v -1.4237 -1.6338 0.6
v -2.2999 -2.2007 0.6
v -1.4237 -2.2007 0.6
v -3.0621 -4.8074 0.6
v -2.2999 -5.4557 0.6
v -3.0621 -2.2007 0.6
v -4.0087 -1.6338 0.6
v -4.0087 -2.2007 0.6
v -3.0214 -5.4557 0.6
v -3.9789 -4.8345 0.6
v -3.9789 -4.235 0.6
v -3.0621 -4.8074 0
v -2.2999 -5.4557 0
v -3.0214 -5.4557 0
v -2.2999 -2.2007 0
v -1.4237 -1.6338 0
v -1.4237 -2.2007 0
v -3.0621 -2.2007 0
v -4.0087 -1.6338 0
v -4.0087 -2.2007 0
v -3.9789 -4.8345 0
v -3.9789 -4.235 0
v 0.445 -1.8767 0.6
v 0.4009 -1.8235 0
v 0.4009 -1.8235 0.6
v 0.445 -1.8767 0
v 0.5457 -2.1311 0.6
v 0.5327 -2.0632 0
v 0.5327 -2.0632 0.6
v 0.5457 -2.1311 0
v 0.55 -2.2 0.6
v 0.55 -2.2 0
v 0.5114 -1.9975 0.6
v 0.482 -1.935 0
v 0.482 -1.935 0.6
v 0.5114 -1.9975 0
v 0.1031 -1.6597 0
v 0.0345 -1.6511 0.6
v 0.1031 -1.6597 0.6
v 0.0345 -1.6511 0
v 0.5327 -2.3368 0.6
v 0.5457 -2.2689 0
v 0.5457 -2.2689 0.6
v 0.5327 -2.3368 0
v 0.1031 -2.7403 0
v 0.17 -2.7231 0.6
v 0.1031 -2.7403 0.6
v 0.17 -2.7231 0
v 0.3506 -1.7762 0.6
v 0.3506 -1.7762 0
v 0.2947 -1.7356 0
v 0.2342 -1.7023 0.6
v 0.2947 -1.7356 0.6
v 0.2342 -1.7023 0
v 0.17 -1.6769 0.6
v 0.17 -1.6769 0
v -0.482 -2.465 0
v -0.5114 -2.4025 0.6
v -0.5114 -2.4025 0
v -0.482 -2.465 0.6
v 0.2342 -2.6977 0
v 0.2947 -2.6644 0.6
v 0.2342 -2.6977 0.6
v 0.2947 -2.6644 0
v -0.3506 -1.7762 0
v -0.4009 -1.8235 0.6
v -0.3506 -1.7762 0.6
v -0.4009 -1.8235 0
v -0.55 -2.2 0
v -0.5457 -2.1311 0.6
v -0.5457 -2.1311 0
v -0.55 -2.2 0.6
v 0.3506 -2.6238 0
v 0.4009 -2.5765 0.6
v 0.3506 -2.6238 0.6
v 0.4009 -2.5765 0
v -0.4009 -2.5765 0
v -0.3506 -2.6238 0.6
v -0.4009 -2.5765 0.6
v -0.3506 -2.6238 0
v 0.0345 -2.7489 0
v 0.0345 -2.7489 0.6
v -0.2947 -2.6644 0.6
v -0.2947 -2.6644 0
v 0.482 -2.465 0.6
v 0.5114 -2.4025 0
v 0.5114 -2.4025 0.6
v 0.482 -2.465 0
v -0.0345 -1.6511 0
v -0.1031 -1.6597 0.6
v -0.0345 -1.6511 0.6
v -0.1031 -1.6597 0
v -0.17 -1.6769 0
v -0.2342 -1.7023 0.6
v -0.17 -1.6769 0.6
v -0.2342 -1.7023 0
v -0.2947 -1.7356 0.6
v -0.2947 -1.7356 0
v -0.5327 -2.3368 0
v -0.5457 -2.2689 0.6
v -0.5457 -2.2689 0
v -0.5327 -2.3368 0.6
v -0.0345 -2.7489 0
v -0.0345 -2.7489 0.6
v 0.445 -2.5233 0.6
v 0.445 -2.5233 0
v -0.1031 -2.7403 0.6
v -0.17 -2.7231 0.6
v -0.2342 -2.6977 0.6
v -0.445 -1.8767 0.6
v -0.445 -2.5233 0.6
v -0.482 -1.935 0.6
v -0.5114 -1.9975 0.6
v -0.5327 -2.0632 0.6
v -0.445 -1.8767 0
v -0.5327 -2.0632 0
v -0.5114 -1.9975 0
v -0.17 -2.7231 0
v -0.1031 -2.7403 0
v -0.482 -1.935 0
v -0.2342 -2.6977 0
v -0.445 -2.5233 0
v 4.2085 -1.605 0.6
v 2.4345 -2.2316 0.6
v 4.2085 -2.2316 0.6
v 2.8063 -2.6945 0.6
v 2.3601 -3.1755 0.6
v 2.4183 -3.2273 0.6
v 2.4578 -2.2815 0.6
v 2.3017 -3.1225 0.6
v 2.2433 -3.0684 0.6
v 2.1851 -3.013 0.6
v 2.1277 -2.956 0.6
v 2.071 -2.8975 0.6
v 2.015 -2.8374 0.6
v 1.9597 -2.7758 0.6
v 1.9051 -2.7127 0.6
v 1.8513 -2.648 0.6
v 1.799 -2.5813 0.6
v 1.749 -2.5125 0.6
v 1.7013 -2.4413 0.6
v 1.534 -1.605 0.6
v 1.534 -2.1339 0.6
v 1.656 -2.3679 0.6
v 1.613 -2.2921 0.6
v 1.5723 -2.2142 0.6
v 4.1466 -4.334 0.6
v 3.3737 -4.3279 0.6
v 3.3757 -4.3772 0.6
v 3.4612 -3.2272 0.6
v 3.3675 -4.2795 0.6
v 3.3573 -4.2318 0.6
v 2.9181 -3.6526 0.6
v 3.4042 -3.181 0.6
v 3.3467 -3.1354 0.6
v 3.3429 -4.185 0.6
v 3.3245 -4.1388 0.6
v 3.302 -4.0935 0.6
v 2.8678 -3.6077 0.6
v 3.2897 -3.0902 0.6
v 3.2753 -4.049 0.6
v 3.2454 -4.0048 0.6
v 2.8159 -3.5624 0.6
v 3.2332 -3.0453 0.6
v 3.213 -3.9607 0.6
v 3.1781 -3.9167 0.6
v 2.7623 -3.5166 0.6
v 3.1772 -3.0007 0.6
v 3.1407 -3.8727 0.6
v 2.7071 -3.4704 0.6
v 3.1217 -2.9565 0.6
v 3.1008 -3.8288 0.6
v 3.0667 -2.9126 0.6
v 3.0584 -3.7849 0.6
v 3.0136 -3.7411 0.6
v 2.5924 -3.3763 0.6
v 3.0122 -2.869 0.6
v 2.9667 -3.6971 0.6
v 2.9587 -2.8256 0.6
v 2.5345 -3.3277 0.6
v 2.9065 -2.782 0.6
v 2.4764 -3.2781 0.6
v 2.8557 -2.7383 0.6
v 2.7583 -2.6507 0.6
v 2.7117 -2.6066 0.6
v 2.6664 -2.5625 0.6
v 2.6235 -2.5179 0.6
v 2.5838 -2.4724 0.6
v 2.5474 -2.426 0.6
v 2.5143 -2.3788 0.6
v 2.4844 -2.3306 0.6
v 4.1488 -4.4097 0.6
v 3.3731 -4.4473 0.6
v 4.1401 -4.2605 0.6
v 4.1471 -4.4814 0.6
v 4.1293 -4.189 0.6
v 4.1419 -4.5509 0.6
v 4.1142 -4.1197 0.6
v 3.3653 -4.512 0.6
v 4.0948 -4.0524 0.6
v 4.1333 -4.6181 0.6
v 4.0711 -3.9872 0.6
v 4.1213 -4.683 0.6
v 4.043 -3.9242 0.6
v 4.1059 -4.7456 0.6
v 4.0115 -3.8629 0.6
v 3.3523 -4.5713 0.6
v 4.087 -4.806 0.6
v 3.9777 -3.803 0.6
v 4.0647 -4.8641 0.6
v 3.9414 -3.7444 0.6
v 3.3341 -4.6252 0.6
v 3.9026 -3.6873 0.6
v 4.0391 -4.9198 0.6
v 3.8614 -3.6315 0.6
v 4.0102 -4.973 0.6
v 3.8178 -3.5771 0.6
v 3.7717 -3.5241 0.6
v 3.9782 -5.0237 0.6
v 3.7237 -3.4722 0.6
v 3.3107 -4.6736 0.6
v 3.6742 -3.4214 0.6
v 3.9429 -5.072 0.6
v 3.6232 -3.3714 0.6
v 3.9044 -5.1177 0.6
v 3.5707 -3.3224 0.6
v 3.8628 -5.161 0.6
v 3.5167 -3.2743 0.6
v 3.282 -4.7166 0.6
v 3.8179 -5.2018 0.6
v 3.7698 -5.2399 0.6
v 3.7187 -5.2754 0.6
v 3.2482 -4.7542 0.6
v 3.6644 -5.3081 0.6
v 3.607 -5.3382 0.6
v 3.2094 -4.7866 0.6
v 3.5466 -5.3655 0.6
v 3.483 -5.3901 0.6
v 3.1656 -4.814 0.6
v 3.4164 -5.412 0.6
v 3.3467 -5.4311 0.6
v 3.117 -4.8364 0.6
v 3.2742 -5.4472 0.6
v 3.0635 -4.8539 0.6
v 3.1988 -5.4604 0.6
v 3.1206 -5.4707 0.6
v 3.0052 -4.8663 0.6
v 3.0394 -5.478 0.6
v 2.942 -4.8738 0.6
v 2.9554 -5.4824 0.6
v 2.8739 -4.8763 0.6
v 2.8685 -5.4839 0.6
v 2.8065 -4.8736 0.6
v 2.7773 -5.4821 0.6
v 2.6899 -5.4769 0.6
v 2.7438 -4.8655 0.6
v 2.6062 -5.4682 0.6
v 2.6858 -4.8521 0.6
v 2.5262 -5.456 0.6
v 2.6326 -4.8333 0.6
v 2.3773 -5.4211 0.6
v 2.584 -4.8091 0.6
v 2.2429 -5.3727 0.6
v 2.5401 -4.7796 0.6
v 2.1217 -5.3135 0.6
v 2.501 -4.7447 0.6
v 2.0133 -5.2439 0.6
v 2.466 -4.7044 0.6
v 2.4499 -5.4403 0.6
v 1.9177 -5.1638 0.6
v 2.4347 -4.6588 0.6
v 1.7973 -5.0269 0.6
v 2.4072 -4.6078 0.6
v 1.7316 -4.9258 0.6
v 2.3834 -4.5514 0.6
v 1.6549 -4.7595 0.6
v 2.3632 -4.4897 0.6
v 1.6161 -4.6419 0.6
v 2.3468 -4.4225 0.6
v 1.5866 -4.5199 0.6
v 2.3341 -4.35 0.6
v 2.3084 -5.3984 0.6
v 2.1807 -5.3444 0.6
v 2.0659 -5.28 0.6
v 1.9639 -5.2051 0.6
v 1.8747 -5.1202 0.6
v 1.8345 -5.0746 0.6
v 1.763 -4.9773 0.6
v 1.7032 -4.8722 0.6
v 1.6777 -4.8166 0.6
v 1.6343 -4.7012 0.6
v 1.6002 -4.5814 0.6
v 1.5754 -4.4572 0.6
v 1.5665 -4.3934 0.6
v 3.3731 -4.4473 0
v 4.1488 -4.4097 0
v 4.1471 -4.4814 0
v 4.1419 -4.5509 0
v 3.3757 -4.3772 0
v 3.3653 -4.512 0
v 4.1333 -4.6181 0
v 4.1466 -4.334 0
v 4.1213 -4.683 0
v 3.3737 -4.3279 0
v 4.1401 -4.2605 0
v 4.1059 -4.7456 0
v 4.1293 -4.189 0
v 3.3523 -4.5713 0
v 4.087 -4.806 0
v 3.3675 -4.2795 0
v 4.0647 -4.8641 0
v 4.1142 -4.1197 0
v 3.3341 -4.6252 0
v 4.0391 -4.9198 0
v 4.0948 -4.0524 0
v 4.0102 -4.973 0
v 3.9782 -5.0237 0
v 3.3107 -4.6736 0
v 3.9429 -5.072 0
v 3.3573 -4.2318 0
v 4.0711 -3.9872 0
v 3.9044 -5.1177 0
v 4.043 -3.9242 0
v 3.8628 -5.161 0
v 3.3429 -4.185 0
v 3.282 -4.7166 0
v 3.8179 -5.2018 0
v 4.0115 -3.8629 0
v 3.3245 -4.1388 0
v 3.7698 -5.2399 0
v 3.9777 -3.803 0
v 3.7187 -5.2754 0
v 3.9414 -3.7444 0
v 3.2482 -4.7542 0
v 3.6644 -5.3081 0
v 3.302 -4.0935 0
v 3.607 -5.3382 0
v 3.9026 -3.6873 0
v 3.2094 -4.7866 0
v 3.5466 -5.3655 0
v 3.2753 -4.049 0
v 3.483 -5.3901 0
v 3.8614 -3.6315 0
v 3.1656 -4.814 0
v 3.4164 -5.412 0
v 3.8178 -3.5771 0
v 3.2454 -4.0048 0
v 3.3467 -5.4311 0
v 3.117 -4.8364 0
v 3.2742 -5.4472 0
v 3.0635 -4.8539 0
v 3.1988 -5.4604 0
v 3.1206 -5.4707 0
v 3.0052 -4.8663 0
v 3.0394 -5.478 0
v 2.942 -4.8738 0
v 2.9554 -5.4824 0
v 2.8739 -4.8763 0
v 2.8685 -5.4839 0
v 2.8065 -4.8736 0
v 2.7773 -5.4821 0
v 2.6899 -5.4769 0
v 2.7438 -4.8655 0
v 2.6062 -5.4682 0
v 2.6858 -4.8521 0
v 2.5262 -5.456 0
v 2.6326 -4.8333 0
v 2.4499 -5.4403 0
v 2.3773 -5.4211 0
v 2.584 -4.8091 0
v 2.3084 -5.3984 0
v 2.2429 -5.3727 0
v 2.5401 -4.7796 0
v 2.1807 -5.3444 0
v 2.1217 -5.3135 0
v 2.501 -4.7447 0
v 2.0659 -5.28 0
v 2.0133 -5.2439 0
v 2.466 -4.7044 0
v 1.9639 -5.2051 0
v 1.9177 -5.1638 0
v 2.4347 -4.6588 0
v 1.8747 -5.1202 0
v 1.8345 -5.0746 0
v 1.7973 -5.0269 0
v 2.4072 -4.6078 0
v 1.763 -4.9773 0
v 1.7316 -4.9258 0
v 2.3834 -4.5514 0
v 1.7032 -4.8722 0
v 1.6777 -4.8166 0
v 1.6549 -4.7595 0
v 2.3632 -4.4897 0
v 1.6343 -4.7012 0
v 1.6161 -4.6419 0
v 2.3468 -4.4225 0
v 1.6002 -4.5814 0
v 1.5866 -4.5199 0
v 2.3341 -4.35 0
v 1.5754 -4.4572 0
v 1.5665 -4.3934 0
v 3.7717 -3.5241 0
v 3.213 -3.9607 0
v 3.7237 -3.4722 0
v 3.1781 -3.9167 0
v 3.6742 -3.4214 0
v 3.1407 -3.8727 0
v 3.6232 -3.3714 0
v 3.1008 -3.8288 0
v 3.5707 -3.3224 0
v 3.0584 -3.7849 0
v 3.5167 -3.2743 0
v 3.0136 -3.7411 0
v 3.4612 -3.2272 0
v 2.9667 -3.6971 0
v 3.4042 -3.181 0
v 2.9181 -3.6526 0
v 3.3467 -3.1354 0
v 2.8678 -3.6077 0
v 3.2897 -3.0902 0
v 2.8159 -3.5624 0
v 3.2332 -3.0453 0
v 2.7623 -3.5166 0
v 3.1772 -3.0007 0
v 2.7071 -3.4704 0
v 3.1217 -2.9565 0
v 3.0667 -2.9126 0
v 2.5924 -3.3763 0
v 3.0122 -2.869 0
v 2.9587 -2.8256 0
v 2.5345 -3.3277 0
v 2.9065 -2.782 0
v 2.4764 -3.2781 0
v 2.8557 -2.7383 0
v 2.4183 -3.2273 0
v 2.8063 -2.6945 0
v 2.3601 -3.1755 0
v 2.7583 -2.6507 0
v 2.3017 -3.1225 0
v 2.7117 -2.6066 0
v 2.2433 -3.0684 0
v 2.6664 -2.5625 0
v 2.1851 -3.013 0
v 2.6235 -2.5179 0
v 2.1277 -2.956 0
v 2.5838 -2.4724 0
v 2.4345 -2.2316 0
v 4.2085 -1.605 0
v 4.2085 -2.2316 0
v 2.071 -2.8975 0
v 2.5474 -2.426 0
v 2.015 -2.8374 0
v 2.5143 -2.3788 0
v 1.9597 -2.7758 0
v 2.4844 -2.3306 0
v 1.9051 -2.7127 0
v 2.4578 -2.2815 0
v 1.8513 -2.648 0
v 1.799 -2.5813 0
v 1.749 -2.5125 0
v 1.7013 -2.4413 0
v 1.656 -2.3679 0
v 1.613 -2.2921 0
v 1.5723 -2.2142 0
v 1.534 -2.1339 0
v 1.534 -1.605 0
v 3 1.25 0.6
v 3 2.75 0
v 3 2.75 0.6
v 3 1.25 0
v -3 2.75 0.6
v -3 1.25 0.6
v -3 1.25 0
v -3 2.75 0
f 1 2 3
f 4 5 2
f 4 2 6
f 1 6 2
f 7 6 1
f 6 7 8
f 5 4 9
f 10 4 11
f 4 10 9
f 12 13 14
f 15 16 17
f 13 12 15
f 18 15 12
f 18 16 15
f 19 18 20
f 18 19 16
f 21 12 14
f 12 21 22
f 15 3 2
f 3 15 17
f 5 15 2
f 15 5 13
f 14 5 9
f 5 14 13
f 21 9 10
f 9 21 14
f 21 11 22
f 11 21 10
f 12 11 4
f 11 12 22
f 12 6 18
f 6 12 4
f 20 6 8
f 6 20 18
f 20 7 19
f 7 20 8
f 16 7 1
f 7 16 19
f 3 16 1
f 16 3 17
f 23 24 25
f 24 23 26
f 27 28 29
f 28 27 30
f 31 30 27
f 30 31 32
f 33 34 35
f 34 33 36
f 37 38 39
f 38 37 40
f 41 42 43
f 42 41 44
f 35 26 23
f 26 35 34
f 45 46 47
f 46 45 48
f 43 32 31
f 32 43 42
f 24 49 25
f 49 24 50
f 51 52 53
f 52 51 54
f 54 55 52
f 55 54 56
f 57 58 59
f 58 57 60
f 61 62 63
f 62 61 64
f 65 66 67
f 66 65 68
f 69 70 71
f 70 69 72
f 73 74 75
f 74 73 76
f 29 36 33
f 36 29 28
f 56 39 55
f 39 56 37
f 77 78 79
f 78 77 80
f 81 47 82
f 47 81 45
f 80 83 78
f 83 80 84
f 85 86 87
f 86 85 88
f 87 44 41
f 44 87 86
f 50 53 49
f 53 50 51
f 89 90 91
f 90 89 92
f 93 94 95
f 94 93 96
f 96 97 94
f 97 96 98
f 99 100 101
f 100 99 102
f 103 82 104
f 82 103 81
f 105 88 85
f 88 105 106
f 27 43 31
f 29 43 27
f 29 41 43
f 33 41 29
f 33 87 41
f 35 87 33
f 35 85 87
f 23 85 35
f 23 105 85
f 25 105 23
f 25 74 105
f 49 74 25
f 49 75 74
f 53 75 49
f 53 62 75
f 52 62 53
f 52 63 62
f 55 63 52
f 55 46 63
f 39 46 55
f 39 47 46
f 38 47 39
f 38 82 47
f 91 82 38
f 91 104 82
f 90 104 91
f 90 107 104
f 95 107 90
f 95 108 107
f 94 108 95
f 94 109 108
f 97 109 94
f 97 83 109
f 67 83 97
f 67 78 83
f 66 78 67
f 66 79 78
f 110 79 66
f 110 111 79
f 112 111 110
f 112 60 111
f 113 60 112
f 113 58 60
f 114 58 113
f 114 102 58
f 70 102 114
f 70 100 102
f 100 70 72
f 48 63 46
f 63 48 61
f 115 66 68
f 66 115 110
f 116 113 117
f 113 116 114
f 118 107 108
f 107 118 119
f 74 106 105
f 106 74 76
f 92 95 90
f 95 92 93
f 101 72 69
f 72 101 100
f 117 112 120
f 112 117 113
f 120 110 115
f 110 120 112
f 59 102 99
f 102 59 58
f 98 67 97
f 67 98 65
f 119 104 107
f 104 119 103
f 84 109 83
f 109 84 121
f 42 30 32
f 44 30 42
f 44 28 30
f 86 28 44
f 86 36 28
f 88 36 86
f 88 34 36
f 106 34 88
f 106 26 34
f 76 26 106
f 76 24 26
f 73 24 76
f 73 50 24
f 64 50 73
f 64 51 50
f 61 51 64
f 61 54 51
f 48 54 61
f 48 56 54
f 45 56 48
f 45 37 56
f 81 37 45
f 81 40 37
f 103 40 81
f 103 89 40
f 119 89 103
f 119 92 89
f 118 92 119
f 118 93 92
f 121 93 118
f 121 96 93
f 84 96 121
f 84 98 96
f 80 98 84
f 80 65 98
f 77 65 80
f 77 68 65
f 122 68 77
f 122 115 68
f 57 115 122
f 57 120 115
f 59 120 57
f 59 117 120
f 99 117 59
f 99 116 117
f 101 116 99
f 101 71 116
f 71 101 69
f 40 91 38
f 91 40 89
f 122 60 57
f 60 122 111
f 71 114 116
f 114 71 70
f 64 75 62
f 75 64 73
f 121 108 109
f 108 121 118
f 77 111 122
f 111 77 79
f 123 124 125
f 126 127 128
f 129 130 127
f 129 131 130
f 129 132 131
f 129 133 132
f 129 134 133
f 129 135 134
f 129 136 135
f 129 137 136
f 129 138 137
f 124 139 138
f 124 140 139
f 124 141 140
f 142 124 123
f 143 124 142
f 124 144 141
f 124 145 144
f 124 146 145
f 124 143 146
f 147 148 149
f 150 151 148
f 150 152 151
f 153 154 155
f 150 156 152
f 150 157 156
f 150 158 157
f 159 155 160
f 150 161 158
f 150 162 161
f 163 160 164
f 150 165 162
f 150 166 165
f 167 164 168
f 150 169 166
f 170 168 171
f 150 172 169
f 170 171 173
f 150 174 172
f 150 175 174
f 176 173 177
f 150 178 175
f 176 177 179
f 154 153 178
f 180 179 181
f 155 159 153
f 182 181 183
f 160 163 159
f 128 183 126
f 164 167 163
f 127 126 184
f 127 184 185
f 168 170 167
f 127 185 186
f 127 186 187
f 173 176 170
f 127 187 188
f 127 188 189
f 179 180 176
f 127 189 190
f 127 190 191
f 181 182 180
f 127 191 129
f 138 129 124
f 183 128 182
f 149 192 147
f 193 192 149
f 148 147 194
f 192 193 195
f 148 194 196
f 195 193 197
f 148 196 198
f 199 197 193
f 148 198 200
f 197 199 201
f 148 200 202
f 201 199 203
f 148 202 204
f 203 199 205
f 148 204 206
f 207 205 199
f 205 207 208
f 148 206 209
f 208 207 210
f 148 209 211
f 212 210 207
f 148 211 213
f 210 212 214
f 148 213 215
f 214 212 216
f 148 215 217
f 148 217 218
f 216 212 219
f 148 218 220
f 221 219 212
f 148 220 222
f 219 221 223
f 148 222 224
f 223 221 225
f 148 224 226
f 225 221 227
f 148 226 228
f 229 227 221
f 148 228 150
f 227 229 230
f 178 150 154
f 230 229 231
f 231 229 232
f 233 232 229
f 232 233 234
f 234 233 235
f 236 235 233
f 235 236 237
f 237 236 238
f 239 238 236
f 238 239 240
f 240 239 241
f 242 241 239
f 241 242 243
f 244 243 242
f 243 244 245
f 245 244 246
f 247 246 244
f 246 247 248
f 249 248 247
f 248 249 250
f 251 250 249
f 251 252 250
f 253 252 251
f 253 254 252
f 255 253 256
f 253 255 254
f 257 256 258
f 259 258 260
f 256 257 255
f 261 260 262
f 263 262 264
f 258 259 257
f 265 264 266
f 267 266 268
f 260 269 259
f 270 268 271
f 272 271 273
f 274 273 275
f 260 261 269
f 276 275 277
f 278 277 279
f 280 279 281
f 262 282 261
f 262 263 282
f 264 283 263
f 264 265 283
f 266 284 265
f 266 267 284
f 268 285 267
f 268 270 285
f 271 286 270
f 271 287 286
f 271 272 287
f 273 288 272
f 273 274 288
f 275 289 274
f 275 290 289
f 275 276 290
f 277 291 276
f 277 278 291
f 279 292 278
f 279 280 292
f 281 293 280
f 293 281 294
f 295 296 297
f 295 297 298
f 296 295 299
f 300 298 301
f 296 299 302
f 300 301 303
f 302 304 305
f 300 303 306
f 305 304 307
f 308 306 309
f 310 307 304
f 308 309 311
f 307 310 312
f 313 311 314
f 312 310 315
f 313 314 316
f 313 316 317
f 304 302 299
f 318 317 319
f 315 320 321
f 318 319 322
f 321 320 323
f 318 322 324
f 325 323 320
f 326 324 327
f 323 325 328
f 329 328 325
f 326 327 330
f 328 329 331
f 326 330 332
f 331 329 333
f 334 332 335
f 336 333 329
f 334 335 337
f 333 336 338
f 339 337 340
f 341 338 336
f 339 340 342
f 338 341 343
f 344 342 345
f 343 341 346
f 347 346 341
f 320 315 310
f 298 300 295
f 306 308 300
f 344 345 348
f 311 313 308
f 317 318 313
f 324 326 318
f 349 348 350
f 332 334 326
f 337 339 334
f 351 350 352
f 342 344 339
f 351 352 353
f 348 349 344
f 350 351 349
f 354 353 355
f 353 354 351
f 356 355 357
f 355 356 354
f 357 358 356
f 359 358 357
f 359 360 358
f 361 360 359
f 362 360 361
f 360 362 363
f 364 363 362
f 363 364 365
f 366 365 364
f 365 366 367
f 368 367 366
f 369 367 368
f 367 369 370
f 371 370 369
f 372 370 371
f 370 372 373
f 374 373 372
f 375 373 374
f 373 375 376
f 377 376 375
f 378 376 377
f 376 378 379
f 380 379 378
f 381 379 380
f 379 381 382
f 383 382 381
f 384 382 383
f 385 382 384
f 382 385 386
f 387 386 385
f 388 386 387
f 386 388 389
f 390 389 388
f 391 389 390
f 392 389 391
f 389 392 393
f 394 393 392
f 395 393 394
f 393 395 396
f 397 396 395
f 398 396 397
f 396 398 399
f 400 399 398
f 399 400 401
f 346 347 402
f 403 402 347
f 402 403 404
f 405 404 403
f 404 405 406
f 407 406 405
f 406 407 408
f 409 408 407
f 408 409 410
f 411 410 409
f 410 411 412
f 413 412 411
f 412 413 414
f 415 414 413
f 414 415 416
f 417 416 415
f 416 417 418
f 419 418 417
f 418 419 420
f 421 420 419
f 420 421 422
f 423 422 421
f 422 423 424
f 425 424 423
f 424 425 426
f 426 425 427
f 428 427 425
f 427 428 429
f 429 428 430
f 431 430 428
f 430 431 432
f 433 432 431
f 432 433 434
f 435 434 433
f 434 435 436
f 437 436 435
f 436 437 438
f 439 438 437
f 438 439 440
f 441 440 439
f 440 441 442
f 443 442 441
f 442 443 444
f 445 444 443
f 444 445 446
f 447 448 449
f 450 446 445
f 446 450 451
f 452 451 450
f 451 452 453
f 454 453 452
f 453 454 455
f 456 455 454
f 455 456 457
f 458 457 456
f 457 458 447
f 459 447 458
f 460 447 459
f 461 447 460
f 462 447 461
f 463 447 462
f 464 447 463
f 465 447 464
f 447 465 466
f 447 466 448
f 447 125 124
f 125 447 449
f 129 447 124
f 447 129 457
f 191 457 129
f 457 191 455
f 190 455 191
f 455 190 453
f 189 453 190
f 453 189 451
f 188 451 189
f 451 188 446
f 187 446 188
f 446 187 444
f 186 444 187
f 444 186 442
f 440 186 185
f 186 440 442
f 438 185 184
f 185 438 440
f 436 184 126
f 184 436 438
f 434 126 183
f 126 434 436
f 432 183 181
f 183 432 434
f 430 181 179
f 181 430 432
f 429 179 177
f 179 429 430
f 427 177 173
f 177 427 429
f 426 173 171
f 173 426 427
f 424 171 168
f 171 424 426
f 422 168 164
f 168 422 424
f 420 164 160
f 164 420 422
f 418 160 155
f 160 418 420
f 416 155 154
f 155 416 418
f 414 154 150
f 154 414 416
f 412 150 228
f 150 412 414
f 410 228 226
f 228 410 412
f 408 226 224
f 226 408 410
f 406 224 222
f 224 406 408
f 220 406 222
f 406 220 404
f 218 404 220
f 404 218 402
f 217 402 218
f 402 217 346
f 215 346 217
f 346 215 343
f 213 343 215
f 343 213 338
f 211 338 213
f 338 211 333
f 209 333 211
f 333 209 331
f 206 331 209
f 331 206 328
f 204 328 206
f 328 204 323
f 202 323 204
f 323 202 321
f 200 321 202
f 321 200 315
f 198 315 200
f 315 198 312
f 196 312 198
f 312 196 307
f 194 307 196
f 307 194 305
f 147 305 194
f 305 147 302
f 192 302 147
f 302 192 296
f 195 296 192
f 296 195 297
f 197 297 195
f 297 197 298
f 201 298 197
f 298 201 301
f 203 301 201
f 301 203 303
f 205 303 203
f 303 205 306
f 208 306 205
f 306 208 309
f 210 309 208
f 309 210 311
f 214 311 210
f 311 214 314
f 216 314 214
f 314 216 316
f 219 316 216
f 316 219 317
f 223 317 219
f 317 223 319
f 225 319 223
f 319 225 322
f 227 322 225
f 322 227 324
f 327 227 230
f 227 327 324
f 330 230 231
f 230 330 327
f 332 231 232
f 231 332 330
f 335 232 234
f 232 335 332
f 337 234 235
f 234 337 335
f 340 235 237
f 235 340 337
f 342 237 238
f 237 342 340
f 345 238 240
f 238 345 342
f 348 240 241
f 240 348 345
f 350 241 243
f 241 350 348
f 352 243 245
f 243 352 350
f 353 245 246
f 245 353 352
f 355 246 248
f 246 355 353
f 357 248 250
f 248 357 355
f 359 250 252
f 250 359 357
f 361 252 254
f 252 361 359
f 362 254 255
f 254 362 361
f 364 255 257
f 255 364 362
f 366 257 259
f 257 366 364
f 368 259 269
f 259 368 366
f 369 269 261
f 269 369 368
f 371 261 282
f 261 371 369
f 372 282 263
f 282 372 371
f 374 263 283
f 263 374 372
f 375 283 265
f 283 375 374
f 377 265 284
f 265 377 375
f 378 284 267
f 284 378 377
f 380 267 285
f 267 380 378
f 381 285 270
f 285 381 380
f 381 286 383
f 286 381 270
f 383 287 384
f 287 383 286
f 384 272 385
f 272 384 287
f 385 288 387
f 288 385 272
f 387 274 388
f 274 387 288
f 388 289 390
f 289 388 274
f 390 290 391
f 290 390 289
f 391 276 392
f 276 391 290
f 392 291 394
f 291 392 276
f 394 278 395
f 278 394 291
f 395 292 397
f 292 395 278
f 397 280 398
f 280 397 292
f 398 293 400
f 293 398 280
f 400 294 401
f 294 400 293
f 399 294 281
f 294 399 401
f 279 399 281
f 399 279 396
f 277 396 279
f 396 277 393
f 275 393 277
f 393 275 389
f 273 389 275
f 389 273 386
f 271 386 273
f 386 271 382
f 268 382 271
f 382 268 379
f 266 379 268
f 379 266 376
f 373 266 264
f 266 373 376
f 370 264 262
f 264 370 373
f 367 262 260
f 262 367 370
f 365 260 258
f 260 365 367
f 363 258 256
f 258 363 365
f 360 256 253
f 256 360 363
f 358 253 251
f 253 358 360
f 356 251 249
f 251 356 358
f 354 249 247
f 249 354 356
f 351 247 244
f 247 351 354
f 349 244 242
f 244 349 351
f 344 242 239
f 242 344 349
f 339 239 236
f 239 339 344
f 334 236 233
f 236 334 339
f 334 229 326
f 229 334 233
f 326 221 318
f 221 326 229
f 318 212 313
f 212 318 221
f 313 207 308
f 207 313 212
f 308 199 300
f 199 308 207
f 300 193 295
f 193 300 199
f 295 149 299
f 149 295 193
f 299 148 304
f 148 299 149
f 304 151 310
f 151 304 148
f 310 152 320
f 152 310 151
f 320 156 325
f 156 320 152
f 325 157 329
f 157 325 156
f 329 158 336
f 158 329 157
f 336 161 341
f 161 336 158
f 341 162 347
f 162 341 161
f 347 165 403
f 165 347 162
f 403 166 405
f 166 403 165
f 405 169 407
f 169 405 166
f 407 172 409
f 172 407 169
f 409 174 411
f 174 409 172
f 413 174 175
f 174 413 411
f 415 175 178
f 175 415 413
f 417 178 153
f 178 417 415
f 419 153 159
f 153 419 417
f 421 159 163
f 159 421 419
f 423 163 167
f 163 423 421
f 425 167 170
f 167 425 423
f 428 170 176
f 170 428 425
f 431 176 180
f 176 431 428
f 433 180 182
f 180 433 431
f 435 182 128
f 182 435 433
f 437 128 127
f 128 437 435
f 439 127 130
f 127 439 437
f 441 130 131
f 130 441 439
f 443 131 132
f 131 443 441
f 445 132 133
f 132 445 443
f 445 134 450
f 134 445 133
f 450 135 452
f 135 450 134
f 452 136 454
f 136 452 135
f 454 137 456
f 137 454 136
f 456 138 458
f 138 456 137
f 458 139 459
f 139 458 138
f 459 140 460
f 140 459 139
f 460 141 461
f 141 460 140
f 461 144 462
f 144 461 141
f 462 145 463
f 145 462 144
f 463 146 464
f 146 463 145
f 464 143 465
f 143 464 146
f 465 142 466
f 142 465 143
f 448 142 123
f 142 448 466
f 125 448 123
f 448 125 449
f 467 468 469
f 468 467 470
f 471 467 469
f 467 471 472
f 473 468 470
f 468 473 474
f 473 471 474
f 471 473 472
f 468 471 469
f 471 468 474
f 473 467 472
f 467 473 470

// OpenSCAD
$fn = 50;

difference() {
	union() {
		translate(v = [-2.85, -3.5, 0.6]) {
			rotate(a = [180, 0, 0]) {
				linear_extrude(height = 0.6) {
					text(font = "Liberation Sans:style=Bold", halign = "center", size = 4.0, text = "1", valign = "center");
				}
			}
		}
		translate(v = [0.0, -2.2, 0.0]) {
			cylinder(h = 0.6, r = 0.55);
		}
		translate(v = [2.85, -3.5, 0.6]) {
			rotate(a = [180, 0, 0]) {
				linear_extrude(height = 0.6) {
					text(font = "Liberation Sans:style=Bold", halign = "center", size = 4.0, text = "2", valign = "center");
				}
			}
		}
		translate(v = [-3.0, 1.25, 0]) {
			cube(size = [6, 1.5, 0.6]);
		}
	}
	union();
}
